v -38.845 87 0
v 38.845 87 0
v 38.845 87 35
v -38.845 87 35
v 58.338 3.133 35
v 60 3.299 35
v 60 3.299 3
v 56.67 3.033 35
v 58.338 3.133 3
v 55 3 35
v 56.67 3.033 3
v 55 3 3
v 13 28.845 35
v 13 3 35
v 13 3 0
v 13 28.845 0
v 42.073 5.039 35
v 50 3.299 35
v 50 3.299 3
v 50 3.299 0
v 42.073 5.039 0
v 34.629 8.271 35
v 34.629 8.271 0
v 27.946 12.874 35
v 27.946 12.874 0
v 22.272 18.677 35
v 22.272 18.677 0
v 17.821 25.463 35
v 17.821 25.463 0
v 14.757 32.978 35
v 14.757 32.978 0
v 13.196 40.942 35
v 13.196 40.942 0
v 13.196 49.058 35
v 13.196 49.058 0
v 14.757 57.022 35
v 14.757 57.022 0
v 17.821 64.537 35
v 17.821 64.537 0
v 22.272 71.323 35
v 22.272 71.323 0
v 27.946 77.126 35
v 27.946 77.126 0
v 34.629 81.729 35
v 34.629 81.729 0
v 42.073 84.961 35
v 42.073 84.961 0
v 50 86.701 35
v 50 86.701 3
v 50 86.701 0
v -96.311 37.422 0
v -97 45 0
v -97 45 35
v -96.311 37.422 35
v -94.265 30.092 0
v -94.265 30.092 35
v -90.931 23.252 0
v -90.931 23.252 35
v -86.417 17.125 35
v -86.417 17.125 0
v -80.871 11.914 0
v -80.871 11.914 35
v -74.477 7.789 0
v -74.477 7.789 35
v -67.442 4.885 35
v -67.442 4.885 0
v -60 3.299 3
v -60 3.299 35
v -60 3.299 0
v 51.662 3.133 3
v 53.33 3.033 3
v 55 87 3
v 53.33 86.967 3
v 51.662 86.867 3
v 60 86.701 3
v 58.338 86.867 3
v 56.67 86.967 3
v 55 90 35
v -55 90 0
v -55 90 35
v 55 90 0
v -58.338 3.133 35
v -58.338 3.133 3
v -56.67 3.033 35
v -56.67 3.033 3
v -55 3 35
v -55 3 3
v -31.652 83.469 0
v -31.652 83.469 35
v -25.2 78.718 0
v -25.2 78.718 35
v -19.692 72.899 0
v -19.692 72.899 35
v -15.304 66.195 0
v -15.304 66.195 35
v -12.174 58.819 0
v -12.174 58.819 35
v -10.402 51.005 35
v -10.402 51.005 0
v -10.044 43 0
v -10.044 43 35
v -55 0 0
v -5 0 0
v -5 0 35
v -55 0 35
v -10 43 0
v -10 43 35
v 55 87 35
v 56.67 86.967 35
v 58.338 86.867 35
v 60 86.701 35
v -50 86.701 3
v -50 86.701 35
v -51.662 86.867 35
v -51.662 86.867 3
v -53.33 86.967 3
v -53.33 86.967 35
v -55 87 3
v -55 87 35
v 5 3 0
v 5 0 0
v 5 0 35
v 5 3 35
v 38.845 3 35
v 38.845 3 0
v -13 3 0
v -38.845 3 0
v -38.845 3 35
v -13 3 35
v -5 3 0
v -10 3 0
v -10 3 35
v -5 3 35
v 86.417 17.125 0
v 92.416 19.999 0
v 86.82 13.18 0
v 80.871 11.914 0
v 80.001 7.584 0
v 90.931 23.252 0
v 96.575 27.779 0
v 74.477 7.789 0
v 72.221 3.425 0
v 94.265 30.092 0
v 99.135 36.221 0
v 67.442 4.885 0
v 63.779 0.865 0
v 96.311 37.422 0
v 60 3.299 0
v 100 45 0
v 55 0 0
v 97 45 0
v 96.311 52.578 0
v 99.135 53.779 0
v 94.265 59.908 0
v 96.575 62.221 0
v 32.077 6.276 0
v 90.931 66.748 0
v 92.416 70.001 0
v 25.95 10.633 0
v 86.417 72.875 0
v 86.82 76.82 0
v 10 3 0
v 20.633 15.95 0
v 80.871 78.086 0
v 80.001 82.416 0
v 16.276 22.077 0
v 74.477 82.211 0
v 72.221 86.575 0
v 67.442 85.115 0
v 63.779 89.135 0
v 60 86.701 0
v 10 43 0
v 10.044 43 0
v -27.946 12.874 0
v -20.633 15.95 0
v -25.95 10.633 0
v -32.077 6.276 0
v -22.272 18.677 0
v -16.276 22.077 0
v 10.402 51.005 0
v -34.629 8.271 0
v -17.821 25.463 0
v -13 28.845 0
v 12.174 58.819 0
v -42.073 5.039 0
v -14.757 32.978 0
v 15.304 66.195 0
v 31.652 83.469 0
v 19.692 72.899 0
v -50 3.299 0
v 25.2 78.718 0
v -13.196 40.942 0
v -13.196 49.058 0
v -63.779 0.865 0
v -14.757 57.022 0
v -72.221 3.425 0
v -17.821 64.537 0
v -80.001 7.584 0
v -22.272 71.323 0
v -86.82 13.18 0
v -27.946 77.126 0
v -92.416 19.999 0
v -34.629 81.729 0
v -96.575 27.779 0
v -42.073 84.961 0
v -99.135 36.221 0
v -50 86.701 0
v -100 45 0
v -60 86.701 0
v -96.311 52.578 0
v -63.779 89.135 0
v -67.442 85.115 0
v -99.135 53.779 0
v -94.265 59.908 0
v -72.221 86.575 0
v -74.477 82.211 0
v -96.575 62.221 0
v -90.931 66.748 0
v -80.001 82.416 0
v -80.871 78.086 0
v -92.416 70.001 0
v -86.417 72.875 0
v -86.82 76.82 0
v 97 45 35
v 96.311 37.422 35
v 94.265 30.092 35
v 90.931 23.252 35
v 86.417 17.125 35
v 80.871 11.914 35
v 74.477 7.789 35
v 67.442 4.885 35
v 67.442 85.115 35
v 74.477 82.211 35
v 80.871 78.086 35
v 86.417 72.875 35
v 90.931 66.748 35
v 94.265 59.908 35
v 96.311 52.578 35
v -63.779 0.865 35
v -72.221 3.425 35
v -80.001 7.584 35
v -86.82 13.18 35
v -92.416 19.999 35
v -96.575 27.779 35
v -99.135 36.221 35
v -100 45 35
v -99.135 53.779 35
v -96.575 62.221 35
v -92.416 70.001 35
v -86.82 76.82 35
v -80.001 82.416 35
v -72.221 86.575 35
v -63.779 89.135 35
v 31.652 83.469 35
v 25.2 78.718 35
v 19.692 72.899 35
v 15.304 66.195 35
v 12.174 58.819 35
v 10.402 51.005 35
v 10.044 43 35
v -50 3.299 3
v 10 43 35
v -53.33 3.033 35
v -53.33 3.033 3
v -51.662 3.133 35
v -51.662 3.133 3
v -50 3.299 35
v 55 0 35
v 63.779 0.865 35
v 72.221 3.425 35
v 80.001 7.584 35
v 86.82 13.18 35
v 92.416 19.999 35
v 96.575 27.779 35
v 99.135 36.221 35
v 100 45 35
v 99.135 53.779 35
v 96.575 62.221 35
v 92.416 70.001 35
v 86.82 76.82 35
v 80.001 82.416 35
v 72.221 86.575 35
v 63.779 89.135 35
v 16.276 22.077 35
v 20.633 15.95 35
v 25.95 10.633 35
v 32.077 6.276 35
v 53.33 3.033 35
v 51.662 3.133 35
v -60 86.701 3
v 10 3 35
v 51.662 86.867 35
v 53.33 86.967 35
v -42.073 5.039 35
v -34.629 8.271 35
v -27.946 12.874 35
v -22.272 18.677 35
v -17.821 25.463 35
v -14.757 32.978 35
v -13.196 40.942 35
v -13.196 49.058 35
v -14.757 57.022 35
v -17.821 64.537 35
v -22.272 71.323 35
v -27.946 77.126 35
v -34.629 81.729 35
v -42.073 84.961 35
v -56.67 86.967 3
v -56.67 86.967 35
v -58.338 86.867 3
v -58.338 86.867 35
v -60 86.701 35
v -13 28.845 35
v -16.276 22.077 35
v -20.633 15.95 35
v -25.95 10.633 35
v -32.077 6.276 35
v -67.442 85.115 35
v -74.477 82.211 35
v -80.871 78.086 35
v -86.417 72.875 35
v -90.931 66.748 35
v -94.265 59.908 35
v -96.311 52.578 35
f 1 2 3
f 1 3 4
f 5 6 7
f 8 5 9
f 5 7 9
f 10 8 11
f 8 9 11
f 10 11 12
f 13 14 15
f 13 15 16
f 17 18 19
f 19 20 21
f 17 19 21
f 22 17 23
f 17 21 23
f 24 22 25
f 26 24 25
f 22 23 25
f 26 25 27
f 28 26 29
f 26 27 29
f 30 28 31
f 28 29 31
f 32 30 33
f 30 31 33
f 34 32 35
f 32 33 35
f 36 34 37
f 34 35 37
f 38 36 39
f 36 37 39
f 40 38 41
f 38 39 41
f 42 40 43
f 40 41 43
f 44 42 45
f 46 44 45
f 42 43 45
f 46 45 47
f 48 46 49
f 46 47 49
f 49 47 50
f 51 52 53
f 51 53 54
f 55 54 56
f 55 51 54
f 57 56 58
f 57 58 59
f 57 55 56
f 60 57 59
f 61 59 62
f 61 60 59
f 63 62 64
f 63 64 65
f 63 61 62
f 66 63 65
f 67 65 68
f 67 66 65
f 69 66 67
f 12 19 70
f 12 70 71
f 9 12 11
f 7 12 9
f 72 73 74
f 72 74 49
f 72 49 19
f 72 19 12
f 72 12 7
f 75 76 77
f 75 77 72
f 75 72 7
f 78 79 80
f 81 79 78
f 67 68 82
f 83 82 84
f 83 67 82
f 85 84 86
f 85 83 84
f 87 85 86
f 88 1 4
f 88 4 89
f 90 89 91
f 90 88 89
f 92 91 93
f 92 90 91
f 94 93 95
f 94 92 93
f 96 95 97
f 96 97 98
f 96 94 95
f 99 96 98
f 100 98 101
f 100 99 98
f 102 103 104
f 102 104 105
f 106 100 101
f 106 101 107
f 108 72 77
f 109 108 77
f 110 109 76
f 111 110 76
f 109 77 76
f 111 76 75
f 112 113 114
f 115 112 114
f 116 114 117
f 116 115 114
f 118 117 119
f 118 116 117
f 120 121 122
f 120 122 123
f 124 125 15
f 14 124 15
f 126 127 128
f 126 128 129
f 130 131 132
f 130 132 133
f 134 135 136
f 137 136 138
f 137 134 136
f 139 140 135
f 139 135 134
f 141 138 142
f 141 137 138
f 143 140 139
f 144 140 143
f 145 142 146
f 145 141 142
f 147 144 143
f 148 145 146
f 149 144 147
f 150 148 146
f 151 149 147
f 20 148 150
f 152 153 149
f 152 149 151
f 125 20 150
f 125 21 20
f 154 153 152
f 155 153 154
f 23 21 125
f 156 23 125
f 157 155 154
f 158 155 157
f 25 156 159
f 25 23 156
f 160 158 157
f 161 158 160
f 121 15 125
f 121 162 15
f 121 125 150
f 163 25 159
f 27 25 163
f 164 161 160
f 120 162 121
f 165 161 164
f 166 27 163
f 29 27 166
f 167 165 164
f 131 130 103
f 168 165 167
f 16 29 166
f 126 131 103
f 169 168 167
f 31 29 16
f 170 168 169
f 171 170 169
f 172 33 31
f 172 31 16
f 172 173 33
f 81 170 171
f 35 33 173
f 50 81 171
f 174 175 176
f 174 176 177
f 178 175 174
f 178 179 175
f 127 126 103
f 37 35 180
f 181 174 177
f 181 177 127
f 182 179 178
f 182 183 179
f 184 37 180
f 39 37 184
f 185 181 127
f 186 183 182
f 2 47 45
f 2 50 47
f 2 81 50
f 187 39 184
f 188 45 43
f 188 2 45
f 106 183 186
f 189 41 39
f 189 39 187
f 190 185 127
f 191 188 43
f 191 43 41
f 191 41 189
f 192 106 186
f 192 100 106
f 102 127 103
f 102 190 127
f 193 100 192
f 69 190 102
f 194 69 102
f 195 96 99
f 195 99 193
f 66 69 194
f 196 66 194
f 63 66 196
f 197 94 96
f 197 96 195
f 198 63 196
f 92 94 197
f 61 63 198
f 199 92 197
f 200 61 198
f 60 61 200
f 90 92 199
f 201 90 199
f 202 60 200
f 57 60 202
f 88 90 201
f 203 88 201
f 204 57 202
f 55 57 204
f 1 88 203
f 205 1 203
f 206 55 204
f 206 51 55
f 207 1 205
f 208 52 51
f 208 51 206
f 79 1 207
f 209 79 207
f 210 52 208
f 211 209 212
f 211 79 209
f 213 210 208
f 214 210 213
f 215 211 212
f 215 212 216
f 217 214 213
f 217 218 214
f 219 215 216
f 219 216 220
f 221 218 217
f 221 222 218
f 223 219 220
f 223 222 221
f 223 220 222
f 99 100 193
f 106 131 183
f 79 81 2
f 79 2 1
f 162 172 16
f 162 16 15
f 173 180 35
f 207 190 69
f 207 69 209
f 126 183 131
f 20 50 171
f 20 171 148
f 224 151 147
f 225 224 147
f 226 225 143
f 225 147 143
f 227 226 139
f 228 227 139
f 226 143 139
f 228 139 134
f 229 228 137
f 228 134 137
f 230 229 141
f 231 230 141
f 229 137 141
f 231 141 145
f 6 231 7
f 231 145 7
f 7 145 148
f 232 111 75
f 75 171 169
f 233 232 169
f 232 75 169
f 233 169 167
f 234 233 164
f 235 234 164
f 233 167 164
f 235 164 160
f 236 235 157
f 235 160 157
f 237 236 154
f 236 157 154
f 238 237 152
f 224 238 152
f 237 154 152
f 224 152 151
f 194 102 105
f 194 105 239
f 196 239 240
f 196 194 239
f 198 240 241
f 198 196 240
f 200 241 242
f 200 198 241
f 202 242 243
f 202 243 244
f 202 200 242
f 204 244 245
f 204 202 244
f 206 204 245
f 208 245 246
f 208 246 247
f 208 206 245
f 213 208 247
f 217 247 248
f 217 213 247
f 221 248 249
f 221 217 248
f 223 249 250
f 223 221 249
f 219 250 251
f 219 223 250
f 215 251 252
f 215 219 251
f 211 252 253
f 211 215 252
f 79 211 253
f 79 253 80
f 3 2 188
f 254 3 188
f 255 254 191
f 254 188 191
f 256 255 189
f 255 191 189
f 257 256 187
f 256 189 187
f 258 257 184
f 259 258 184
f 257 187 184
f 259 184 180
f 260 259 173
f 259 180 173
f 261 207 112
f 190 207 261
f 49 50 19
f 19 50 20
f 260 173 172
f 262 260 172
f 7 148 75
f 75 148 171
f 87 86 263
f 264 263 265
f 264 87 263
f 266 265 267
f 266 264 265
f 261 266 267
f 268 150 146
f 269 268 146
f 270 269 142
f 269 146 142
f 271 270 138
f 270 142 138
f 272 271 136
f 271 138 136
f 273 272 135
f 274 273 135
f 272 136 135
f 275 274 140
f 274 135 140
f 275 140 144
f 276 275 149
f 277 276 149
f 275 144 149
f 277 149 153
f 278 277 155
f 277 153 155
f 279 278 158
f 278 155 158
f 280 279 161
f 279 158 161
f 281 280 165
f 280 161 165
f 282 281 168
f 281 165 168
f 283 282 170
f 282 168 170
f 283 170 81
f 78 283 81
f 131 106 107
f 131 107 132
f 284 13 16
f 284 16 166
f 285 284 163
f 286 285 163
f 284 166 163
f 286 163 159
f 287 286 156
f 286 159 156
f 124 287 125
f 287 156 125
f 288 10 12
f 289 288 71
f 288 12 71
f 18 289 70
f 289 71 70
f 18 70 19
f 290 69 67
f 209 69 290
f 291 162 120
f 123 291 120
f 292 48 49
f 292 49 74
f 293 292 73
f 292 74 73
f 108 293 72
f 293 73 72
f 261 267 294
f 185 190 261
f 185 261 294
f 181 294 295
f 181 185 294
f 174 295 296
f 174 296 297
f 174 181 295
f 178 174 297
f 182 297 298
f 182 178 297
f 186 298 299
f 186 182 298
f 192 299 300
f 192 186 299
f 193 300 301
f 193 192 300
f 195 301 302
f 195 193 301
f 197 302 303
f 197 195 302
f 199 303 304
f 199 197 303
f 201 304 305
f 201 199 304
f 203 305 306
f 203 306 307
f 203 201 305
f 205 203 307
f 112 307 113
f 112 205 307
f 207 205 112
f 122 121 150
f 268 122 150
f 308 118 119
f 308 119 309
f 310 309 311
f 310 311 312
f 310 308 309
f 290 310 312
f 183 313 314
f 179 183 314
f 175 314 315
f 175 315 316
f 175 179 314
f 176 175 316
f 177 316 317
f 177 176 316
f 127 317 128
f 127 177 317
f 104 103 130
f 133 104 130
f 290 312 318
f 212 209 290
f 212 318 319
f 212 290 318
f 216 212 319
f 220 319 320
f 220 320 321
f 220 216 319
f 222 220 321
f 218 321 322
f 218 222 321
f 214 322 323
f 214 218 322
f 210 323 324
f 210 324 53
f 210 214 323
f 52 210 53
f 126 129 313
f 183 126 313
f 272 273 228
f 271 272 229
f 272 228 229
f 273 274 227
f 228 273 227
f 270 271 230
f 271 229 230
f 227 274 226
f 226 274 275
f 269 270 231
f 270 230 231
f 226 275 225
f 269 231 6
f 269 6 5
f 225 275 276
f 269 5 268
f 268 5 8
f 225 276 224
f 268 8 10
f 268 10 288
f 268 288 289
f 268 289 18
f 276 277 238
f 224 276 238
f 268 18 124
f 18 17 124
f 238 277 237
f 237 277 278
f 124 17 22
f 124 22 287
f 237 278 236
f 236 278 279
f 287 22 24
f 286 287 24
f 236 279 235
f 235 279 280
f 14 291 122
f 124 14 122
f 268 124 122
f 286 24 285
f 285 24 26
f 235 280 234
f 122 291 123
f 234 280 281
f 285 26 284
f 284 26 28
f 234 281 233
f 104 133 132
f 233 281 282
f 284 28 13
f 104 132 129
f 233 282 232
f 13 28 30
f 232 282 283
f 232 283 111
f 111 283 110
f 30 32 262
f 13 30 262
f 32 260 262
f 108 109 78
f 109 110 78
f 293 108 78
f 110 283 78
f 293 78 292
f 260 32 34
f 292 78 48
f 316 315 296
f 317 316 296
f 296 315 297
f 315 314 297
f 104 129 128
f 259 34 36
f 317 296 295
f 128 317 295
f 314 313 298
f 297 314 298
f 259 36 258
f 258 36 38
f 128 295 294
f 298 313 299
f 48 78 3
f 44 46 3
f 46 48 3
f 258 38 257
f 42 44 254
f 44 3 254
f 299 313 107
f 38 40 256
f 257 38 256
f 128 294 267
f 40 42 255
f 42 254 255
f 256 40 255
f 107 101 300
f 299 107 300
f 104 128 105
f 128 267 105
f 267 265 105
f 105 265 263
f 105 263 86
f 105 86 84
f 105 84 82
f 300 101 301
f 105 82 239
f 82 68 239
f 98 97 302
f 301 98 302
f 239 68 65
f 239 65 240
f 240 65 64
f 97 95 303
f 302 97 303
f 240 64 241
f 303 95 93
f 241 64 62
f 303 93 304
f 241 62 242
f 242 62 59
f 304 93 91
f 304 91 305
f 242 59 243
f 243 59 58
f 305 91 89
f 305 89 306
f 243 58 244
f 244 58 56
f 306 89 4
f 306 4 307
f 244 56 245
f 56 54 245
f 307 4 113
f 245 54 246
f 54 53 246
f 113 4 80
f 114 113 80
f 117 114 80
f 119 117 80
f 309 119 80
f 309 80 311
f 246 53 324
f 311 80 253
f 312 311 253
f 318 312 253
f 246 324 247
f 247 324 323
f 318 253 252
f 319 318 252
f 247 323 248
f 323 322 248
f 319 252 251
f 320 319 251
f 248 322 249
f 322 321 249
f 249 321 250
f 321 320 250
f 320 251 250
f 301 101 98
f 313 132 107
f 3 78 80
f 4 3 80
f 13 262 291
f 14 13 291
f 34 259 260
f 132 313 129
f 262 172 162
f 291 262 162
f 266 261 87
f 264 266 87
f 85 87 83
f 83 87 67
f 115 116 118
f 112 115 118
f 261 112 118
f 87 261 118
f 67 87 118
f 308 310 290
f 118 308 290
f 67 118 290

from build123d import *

# Parameters (mm, degrees)
F0_W     = 5
F0_H     = 3
F1_DEPTH = 35
F2_DEPTH = 3


with BuildPart() as f1:
    # F0 (on Top) → F1 (new body)
    with BuildSketch(Plane.XY):
        with Locations((7.5, 1.5)):
            Rectangle(F0_W, F0_H)
        with BuildLine():
            Line((10, 3), (10, 0))
            Line((10, 0), (55, 0))
            ThreePointArc((55, 0), (46.7841616374, 0.7563563887), (38.8445055786, 3))
            Line((38.8445055786, 3), (13, 3))
            Line((13, 3), (10, 3))
        make_face()
        with BuildLine():
            Line((10, 43), (10, 3))
            Line((10, 3), (13, 3))
            Line((13, 3), (13, 28.8445055786))
            ThreePointArc((13, 28.8445055786), (10.9499068005, 35.8027564392), (10.044466414, 43))
            Line((10.044466414, 43), (10, 43))
        make_face()
        with BuildLine():
            ThreePointArc((38.8445055786, 3), (46.7841616374, 0.7563563887), (55, 0))
            Line((55, 0), (55, 3))
            Line((55, 3), (38.8445055786, 3))
        make_face()
        with BuildLine():
            Line((38.8445055786, 3), (55, 3))
            ThreePointArc((55, 3), (52.4955434529, 3.074736764), (50, 3.298681076))
            ThreePointArc((50, 3.298681076), (13, 45), (50, 86.701318924))
            ThreePointArc((50, 86.701318924), (52.4955434529, 86.925263236), (55, 87))
            Line((55, 87), (38.8445055786, 87))
            ThreePointArc((38.8445055786, 87), (17.3484470967, 69.6446863232), (10.044466414, 43))
            Line((10.044466414, 43), (13, 43))
            Line((13, 43), (13, 28.8445055786))
            ThreePointArc((13, 28.8445055786), (23.1801948466, 13.1801948466), (38.8445055786, 3))
        make_face()
        with BuildLine():
            Line((55, 3), (55, 0))
            ThreePointArc((55, 0), (86.8198051534, 13.1801948466), (100, 45))
            ThreePointArc((100, 45), (86.8198051534, 76.8198051534), (55, 90))
            Line((55, 90), (55, 87))
            ThreePointArc((55, 87), (57.5044565471, 86.925263236), (60, 86.701318924))
            ThreePointArc((60, 86.701318924), (86.4165561448, 72.8747197295), (97, 45))
            ThreePointArc((97, 45), (86.4165561448, 17.1252802705), (60, 3.298681076))
            ThreePointArc((60, 3.298681076), (57.5044565471, 3.074736764), (55, 3))
        make_face()
        with BuildLine():
            Line((55, 87), (55, 90))
            ThreePointArc((55, 90), (46.7841616374, 89.2436436113), (38.8445055786, 87))
            Line((38.8445055786, 87), (55, 87))
        make_face()
        with BuildLine():
            ThreePointArc((38.8445055786, 87), (46.7841616374, 89.2436436113), (55, 90))
            Line((55, 90), (0, 90))
            Line((0, 90), (0, 87))
            Line((0, 87), (38.8445055786, 87))
        make_face()
        with BuildLine():
            ThreePointArc((10.044466414, 43), (10.9499068005, 35.8027564392), (13, 28.8445055786))
            Line((13, 28.8445055786), (13, 43))
            Line((13, 43), (10.044466414, 43))
        make_face()
    extrude(amount=F1_DEPTH)

    # F0 (on Top) → F2 (join)
    with BuildSketch(Plane.XY):
        with BuildLine():
            Line((50, 45), (55, 45))
            Line((55, 45), (55, 87))
            ThreePointArc((55, 87), (52.4955434529, 86.925263236), (50, 86.701318924))
            Line((50, 86.701318924), (50, 45))
        make_face()
        with BuildLine():
            Line((55, 87), (55, 45))
            Line((55, 45), (60, 45))
            Line((60, 45), (60, 86.701318924))
            ThreePointArc((60, 86.701318924), (57.5044565471, 86.925263236), (55, 87))
        make_face()
        with BuildLine():
            ThreePointArc((50, 3.298681076), (52.4955434529, 3.074736764), (55, 3))
            Line((55, 3), (55, 45))
            Line((55, 45), (50, 45))
            Line((50, 45), (50, 3.298681076))
        make_face()
        with BuildLine():
            Line((55, 45), (55, 3))
            ThreePointArc((55, 3), (57.5044565471, 3.074736764), (60, 3.298681076))
            Line((60, 3.298681076), (60, 45))
            Line((60, 45), (55, 45))
        make_face()
    extrude(amount=F2_DEPTH)

    # F3: F1 across plane


with BuildPart() as f1_1:
    add(f1.part)
    add(f1.part.mirror(Plane.YZ))


solid = f1_1.part
